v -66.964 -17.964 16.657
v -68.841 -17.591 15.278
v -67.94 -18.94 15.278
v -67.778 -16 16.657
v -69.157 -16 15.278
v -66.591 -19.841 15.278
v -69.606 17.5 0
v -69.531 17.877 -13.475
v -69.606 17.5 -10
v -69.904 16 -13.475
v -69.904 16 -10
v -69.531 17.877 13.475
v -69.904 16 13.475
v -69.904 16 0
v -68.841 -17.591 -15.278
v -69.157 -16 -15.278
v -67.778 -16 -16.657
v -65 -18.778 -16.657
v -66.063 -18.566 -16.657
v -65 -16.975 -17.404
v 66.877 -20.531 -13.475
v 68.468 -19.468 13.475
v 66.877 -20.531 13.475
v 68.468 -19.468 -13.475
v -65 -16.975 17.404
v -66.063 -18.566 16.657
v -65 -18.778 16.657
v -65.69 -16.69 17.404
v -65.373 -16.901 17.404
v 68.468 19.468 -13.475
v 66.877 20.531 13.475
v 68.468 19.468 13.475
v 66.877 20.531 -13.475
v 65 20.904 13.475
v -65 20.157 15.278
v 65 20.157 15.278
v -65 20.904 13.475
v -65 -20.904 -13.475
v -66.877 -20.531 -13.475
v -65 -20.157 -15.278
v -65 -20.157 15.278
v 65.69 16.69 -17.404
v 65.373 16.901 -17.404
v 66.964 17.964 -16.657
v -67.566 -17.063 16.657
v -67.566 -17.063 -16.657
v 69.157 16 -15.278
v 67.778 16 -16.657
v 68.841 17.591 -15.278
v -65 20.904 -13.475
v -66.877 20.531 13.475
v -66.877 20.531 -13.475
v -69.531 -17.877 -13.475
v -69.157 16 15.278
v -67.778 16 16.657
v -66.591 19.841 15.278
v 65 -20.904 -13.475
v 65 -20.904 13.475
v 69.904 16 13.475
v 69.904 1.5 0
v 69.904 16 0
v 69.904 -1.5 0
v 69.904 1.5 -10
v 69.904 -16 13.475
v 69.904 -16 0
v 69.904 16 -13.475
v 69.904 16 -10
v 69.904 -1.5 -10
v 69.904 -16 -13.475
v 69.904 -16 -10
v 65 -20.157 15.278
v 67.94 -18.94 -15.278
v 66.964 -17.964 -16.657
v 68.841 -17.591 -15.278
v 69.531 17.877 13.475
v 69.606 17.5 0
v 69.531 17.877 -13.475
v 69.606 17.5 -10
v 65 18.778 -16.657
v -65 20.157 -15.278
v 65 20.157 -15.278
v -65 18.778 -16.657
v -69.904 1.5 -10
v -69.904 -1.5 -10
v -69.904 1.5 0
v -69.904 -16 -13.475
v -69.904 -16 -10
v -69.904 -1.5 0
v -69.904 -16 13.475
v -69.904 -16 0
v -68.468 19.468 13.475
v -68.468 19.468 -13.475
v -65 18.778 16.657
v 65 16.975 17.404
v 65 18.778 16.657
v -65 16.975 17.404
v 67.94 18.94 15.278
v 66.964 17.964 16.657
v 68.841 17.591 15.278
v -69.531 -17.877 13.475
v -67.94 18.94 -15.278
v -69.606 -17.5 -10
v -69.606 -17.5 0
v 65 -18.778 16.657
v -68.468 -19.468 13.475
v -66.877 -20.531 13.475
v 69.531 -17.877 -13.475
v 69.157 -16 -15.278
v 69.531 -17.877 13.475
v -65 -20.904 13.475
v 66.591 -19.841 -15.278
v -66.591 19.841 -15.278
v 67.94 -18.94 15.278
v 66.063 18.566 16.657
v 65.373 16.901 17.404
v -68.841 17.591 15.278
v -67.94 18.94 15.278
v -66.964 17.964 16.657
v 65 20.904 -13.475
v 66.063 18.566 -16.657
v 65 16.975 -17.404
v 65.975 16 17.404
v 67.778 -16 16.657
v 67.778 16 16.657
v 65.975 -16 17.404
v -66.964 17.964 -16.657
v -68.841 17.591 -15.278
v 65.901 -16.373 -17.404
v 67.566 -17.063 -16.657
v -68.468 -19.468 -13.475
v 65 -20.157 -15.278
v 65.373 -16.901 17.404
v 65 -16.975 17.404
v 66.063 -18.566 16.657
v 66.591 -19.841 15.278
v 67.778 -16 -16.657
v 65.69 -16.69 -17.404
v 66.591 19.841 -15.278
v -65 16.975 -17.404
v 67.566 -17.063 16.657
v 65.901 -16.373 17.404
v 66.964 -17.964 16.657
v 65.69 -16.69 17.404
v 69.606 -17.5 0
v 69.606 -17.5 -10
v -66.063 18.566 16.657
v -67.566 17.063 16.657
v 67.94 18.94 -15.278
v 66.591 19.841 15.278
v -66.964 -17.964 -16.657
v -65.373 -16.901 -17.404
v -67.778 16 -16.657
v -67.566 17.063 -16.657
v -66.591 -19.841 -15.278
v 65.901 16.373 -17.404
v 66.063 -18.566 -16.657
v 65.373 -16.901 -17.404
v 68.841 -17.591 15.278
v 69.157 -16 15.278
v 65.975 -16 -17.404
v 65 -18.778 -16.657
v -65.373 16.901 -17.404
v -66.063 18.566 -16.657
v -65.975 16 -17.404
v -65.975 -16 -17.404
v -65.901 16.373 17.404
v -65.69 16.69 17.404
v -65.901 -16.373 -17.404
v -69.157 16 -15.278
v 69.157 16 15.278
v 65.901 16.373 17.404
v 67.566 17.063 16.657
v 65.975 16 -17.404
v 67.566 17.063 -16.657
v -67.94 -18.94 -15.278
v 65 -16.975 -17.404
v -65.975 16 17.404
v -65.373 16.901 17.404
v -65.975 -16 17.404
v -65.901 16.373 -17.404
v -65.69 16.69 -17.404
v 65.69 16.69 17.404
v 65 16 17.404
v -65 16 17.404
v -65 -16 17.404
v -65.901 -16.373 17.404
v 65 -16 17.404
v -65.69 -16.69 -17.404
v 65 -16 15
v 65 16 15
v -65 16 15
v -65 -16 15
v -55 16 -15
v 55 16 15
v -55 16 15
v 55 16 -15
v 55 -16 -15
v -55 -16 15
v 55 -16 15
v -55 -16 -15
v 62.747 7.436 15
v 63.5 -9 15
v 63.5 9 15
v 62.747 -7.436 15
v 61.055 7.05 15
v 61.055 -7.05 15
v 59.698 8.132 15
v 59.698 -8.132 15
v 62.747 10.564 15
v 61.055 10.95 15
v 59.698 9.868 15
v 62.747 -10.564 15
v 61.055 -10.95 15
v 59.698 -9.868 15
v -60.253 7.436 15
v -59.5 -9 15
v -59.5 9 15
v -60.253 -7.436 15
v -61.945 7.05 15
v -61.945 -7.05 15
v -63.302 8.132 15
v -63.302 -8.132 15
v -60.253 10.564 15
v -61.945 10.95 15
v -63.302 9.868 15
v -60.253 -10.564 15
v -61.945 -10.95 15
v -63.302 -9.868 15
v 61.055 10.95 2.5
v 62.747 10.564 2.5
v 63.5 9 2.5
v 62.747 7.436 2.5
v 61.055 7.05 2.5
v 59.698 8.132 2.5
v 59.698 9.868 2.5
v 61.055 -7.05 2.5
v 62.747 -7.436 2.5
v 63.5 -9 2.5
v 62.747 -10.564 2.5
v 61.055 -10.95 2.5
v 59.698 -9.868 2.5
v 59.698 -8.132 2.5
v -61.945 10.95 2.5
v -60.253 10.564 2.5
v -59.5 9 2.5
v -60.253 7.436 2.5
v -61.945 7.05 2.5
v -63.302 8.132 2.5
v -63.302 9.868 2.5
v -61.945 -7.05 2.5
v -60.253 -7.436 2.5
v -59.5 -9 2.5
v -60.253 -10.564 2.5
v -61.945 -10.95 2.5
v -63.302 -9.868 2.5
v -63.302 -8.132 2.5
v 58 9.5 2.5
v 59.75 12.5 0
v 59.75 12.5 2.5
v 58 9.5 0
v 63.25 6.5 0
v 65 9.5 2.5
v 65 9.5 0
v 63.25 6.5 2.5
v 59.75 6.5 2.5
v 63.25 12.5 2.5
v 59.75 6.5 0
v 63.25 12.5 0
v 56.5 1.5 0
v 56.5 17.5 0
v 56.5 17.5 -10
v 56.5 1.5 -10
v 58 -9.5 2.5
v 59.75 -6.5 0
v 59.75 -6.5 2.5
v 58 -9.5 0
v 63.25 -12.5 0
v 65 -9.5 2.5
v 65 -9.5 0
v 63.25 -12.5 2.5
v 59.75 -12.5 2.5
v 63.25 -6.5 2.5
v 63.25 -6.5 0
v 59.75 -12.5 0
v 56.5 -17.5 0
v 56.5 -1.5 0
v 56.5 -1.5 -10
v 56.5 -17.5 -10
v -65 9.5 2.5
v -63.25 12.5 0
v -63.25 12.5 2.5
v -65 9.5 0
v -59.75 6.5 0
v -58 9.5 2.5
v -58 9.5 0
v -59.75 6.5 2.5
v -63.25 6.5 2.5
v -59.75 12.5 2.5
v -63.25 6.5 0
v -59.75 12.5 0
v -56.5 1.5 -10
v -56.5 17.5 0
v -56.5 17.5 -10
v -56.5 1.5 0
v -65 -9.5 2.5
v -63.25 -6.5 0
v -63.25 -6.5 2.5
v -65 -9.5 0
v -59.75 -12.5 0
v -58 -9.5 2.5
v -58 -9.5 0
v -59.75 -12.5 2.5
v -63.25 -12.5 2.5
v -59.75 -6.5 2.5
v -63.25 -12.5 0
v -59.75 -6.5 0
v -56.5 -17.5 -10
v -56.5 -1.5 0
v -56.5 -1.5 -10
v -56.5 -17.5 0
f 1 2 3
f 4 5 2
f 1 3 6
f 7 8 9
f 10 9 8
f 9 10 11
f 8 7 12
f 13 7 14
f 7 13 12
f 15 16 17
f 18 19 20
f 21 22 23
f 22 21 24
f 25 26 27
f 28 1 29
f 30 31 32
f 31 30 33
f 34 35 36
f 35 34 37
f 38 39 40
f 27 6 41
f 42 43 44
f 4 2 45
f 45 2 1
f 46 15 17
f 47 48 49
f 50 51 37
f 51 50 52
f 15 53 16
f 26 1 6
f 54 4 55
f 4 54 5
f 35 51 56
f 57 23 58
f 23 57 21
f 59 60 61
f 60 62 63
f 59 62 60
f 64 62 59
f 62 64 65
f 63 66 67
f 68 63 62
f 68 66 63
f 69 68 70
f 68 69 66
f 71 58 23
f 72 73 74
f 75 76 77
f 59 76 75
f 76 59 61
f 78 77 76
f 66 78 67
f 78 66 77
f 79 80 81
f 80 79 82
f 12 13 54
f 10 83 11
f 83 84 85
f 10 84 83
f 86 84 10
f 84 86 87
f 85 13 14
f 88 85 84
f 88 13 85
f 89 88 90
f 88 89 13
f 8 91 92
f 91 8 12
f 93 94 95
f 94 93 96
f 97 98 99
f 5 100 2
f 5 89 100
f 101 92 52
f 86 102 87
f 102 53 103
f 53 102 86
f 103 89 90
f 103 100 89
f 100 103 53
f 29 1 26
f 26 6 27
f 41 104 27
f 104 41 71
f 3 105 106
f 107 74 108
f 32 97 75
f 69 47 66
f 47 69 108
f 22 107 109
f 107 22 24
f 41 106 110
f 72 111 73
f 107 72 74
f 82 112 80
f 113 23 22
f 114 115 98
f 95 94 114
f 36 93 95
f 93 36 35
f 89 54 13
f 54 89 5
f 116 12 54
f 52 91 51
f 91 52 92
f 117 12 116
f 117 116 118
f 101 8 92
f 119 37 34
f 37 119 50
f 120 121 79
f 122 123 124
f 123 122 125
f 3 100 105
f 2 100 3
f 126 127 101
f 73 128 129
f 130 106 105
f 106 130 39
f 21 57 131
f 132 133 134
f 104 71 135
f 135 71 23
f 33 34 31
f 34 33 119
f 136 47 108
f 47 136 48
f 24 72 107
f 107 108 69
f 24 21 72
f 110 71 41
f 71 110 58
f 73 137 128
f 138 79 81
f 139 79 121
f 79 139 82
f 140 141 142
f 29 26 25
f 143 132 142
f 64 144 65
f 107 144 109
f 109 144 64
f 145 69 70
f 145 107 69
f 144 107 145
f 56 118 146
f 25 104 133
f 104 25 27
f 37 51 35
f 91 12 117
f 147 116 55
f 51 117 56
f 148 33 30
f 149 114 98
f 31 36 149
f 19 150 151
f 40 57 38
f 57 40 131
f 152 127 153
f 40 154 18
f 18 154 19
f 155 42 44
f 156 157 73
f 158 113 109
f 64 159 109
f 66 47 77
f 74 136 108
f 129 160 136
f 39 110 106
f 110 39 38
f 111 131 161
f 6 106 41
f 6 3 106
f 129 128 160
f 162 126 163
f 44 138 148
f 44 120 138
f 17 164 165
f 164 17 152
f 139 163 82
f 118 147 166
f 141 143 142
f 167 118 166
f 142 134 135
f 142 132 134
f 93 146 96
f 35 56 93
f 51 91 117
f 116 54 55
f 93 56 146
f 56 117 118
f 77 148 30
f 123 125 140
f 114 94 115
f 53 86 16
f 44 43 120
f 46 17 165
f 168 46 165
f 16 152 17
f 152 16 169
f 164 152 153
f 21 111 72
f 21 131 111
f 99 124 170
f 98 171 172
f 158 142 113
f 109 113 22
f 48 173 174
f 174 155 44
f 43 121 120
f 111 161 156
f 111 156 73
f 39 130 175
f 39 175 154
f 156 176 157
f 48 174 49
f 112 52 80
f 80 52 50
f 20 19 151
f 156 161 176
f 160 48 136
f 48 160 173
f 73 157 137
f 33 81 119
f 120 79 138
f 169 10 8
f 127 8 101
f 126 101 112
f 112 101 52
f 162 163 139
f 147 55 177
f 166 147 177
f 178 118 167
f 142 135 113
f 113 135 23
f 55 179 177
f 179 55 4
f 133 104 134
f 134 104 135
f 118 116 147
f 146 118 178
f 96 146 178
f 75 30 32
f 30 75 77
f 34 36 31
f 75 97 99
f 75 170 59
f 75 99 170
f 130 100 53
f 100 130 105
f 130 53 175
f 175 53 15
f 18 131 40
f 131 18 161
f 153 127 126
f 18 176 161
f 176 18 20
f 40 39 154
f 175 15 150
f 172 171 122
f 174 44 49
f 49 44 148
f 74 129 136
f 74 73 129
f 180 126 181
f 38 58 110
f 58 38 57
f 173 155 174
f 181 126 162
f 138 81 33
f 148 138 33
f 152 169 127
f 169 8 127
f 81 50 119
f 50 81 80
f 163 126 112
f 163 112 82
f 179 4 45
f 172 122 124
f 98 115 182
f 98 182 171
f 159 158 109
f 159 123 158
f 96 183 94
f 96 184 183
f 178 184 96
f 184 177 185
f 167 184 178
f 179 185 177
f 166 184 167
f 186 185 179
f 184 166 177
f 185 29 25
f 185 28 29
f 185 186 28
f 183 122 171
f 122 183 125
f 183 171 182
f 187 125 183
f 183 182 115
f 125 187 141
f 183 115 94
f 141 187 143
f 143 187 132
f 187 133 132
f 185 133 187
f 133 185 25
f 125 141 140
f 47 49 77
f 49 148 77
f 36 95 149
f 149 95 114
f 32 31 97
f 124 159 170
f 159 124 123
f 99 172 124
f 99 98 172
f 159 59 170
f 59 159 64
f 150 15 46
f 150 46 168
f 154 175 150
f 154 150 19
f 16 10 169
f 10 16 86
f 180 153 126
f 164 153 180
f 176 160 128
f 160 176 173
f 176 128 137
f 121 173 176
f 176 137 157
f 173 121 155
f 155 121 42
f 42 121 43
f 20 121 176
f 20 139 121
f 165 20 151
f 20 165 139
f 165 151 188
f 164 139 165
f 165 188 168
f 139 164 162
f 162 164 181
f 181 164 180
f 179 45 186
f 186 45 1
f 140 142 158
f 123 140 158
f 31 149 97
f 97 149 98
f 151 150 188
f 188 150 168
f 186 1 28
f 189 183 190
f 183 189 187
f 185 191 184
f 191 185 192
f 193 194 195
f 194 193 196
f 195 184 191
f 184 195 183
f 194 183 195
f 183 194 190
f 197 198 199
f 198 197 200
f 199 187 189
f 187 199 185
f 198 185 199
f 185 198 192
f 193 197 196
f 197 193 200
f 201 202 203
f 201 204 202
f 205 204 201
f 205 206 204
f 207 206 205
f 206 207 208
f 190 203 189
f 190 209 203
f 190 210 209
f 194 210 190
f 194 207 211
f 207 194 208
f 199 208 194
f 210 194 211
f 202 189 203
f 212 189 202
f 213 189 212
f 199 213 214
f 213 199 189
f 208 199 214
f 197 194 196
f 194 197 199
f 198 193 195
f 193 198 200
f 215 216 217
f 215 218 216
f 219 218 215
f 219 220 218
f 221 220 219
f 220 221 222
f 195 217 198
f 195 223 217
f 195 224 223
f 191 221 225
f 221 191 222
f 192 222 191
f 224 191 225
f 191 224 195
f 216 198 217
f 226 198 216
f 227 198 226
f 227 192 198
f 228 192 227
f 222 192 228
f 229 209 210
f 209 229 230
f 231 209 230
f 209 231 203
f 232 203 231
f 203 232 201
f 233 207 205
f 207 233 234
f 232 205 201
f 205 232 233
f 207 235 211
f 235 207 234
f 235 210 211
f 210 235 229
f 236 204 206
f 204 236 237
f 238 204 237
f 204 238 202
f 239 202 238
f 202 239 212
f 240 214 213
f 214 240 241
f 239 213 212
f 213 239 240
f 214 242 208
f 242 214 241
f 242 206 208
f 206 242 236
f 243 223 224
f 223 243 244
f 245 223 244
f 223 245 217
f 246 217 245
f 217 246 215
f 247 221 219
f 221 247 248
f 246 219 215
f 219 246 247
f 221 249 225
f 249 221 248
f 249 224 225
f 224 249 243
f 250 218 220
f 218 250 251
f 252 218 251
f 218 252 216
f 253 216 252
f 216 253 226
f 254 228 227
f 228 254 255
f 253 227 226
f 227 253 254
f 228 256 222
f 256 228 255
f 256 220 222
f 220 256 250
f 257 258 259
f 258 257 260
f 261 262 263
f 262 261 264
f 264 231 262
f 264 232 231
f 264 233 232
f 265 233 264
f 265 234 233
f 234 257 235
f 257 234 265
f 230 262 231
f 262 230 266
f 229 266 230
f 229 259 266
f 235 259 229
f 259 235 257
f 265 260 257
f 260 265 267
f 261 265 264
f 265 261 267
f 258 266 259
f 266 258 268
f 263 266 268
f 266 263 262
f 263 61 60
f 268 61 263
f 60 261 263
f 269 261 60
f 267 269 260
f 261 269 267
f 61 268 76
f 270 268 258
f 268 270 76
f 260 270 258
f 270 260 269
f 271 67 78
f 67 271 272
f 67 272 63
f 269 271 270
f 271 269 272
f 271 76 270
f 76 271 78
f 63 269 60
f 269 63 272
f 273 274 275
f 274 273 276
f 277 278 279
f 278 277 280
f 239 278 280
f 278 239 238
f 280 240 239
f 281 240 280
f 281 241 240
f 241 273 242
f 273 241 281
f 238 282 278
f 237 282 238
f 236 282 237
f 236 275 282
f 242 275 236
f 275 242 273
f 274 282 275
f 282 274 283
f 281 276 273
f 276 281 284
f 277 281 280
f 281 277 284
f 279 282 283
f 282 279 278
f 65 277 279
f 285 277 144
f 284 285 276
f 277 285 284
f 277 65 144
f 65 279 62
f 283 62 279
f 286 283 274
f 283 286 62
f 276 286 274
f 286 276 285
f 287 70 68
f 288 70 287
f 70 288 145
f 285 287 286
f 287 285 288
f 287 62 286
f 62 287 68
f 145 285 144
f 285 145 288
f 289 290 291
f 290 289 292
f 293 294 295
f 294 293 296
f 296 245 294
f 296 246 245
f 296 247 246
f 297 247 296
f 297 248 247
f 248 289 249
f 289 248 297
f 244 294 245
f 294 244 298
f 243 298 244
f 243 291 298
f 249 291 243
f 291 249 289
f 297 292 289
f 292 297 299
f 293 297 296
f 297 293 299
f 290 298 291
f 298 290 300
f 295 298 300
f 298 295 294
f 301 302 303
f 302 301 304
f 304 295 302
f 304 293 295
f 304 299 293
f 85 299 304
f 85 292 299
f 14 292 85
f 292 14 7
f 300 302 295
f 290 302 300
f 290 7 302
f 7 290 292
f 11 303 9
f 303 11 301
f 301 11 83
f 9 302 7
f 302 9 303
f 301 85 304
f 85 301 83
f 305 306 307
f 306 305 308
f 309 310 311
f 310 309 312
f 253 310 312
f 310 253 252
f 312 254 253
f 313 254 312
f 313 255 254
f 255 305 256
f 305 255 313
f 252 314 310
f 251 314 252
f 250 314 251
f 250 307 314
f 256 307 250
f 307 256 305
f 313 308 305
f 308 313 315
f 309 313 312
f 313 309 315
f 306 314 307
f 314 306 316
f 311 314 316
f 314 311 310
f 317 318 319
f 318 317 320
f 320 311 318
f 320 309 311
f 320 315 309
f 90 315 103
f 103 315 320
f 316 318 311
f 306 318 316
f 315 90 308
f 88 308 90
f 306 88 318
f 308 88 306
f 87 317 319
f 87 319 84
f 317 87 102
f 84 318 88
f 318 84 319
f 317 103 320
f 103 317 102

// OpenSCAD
width = 32; 
length  = 130;
depth = 25;
corner_radius = 5;
ledge_length = 10;

module shell_basis() {
  minkowski() {
    cube([length, width, depth], center = true);
    sphere(corner_radius);
  }
}

module shell_chop_off() {
  chop_depth = corner_radius;
  translate([0, 0, depth/2 + corner_radius])
    cube([length, width, chop_depth], center = true);
}

module shell() {
  difference() {
    shell_basis();
    shell_chop_off();
  }
}

module cup_hole() {
  hole_depth = depth + corner_radius;
  cube([length, width, hole_depth], center = true);
}

module ledge() {
  translate([0, 0, 0]) {
    cube([ledge_length, width, depth + corner_radius], center = true);
  }
}

module ledges() {
  translate([length/2 - ledge_length/2, 0, 0])
    ledge();
  translate([-length/2 + ledge_length/2, 0, 0])
    ledge();
}  

module screw_hole() {
  diameter = 4;
  translate([0, 0, 10]) {
    cylinder(h = 30, d = diameter, center = true);
  } 
}

module screw_holes() {
  width_inset = 7;
  length_inset = 3.5;
  x = length/2 - length_inset;
  y = width/2 - width_inset; 
  translate([x, y, 0]) { 
    screw_hole(); 
  }
  translate([x, -y,  0]) {
    screw_hole();
  }
  translate([-x, y, 0]) {
    screw_hole();
  }
  translate([-x, -y, 0]) {
    screw_hole();
  }
}

module nut_hole() {
  x1 = -3.5;
  y1 = 0;
  x2 = -1.75;
  y2 = 3;
  x3 = 1.75;
  y3 = 3;
  x4 = 3.5;
  y4 = 0;
  x5 = 1.75;
  y5 = -3;
  x6 = -1.75;
  y6 = -3;

  linear_extrude(height = 5, center = true) {
    polygon([[x1, y1], [x2,y2], [x3,y3], [x4,y4], [x5, y5], [x6, y6]]);
  }
}
  
module finger_hole() {
  translate([0, 0, -5]) {
    cube([16, 16, 10], center = true);
  }
}

module nut_holes() {
  width_inset = 6.5;
  length_inset = 3.5;
  x = length/2 - length_inset;
  y = width/2 - width_inset; 
  translate([x, y, 0]) { 
    nut_hole(); 
  }
  translate([x+3, y, 0]) {
    finger_hole(); 
  }
  translate([x, -y,  0]) {
    nut_hole();
  }
  translate([x+3, -y, 0]) {
    finger_hole(); 
  }
  translate([-x, y, 0]) {
    nut_hole();
  }
  translate([-(x+3), y, 0]) {
    finger_hole(); 
  }
  translate([-x, -y, 0]) {
    nut_hole();
  }
  translate([-(x+3), -y, 0]) {
      finger_hole(); 
  }
}
  
module main_cup_shape() {
  union() {
    difference() {
      shell();
      cup_hole();
      shell_chop_off();
    }
    ledges();
  }
}

difference() {
  main_cup_shape();
  screw_holes();
  nut_holes();
}
